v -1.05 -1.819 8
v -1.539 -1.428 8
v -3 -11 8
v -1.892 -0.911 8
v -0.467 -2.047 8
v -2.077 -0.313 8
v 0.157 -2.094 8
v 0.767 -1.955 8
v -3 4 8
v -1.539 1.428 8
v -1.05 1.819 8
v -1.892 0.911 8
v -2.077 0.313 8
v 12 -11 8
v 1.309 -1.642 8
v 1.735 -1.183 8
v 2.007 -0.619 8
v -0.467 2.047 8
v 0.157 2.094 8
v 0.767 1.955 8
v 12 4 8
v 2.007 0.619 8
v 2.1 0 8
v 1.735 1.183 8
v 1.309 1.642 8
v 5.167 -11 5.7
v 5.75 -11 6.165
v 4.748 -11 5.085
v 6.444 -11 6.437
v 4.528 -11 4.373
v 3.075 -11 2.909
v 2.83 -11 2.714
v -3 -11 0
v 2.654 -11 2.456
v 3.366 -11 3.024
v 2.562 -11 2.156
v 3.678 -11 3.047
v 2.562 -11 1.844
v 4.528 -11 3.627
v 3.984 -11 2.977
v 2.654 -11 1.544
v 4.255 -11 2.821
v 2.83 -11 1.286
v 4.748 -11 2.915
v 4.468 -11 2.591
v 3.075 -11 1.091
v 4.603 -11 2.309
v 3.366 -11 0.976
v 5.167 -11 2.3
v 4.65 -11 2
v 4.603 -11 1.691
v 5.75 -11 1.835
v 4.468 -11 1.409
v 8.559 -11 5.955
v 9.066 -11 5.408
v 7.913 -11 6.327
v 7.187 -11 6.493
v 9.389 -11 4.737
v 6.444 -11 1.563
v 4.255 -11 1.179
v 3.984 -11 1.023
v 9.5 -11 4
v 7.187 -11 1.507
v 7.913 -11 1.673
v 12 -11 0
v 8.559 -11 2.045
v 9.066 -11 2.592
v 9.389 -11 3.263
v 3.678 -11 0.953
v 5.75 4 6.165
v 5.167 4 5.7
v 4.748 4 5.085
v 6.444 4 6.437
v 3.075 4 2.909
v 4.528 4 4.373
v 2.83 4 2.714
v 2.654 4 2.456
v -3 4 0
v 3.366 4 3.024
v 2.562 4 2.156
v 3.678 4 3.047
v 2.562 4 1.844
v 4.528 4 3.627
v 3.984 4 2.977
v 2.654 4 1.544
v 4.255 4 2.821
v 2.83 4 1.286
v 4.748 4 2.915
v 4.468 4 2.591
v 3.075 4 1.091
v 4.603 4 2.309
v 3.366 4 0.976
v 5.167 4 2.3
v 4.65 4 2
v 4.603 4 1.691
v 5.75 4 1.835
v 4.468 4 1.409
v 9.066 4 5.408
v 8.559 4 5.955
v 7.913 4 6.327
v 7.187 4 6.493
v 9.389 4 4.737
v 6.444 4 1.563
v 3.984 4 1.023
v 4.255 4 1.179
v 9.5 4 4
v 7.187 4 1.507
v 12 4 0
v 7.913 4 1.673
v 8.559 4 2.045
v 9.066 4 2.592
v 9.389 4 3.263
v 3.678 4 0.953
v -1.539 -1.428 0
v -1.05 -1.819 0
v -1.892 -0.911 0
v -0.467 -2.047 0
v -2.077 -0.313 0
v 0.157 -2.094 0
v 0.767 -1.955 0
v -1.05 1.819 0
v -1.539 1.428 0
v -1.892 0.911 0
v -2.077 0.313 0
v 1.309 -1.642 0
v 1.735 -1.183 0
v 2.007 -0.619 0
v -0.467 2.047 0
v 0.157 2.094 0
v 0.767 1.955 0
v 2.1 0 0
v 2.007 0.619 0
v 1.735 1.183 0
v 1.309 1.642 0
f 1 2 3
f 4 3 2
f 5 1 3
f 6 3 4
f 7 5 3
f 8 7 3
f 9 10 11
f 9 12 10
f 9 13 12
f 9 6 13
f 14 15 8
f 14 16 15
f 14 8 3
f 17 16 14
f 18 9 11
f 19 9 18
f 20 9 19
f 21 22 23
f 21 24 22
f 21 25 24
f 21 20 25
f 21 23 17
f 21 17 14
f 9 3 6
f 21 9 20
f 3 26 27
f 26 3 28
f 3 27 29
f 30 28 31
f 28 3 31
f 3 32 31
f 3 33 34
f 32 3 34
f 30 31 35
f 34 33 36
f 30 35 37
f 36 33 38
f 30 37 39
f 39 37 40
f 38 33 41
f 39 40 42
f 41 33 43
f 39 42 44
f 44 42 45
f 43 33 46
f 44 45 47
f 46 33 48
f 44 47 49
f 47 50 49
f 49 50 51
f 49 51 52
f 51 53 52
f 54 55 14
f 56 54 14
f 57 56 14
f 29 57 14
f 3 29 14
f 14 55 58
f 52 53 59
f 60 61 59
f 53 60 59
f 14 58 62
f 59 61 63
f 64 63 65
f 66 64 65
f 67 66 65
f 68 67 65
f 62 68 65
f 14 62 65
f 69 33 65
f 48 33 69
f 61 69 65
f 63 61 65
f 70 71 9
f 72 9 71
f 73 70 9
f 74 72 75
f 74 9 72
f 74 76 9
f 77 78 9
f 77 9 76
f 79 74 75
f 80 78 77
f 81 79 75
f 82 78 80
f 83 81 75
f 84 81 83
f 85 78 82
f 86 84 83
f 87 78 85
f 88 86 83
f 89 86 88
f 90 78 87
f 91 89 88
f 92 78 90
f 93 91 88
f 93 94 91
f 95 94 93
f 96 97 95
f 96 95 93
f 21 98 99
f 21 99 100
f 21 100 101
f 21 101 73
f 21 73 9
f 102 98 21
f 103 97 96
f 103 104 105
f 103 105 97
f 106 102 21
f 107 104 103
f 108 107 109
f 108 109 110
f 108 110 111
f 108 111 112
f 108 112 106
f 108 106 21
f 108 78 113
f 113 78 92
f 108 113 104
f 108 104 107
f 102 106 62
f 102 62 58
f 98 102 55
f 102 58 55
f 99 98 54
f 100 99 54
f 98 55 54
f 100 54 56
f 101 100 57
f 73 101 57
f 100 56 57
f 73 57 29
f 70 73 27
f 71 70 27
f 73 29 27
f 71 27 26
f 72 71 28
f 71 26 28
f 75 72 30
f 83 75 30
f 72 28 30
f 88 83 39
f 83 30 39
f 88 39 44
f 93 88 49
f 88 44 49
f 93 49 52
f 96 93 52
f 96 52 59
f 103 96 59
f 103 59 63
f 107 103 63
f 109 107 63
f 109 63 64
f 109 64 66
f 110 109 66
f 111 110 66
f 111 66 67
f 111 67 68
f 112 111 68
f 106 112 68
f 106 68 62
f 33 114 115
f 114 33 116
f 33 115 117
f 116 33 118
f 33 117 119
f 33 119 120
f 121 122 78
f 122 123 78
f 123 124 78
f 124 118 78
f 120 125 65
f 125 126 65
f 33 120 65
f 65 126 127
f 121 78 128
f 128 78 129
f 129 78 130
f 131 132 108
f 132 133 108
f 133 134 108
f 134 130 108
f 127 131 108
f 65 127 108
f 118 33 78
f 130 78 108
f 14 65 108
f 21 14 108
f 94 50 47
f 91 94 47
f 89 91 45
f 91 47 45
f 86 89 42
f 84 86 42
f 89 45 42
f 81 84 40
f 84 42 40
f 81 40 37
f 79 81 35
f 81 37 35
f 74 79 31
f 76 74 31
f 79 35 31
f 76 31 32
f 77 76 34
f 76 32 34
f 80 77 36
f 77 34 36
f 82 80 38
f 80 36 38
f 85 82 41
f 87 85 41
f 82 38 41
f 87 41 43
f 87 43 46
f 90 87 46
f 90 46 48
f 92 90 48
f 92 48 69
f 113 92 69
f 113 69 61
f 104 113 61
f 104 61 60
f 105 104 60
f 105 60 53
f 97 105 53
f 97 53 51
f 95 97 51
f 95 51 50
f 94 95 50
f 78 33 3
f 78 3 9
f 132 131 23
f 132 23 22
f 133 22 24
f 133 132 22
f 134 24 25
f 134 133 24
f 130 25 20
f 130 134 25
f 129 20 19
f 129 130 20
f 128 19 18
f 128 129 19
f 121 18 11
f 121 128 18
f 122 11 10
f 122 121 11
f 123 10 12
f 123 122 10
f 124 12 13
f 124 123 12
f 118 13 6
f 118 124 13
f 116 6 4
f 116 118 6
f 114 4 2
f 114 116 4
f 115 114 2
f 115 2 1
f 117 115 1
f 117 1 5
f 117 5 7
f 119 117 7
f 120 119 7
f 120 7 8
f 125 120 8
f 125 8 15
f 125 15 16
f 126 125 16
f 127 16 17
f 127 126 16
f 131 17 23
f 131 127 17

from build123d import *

# Parameters (mm, degrees)
SKETCH1_W           = 15
SKETCH1_H           = 15
SKETCH1_R           = 2.1
BOSS_EXTRUDE1_DEPTH = 8
SKETCH2_R           = 2.5
CUT_EXTRUDE1_DEPTH  = 16
SKETCH3_R           = 1.05
CUT_EXTRUDE2_DEPTH  = 16


with BuildPart() as part:
    # Sketch1 → Boss-Extrude1 (new body)
    with BuildSketch(Plane.XY):
        with Locations((4.5, -3.5)):
            Rectangle(SKETCH1_W, SKETCH1_H)
        Circle(SKETCH1_R, mode=Mode.SUBTRACT)
    extrude(amount=BOSS_EXTRUDE1_DEPTH)

    # Sketch2 → Cut-Extrude1 (cut, through all)
    with BuildSketch(Plane.XZ.offset(11)):
        with Locations((7, 4)):
            Circle(SKETCH2_R)
    extrude(amount=-CUT_EXTRUDE1_DEPTH, mode=Mode.SUBTRACT)

    # Sketch3 → Cut-Extrude2 (cut, through all)
    with BuildSketch(Plane.XZ.offset(11)):
        with Locations((3.6, 2)):
            Circle(SKETCH3_R)
    extrude(amount=-CUT_EXTRUDE2_DEPTH, mode=Mode.SUBTRACT)


solid = part.part
